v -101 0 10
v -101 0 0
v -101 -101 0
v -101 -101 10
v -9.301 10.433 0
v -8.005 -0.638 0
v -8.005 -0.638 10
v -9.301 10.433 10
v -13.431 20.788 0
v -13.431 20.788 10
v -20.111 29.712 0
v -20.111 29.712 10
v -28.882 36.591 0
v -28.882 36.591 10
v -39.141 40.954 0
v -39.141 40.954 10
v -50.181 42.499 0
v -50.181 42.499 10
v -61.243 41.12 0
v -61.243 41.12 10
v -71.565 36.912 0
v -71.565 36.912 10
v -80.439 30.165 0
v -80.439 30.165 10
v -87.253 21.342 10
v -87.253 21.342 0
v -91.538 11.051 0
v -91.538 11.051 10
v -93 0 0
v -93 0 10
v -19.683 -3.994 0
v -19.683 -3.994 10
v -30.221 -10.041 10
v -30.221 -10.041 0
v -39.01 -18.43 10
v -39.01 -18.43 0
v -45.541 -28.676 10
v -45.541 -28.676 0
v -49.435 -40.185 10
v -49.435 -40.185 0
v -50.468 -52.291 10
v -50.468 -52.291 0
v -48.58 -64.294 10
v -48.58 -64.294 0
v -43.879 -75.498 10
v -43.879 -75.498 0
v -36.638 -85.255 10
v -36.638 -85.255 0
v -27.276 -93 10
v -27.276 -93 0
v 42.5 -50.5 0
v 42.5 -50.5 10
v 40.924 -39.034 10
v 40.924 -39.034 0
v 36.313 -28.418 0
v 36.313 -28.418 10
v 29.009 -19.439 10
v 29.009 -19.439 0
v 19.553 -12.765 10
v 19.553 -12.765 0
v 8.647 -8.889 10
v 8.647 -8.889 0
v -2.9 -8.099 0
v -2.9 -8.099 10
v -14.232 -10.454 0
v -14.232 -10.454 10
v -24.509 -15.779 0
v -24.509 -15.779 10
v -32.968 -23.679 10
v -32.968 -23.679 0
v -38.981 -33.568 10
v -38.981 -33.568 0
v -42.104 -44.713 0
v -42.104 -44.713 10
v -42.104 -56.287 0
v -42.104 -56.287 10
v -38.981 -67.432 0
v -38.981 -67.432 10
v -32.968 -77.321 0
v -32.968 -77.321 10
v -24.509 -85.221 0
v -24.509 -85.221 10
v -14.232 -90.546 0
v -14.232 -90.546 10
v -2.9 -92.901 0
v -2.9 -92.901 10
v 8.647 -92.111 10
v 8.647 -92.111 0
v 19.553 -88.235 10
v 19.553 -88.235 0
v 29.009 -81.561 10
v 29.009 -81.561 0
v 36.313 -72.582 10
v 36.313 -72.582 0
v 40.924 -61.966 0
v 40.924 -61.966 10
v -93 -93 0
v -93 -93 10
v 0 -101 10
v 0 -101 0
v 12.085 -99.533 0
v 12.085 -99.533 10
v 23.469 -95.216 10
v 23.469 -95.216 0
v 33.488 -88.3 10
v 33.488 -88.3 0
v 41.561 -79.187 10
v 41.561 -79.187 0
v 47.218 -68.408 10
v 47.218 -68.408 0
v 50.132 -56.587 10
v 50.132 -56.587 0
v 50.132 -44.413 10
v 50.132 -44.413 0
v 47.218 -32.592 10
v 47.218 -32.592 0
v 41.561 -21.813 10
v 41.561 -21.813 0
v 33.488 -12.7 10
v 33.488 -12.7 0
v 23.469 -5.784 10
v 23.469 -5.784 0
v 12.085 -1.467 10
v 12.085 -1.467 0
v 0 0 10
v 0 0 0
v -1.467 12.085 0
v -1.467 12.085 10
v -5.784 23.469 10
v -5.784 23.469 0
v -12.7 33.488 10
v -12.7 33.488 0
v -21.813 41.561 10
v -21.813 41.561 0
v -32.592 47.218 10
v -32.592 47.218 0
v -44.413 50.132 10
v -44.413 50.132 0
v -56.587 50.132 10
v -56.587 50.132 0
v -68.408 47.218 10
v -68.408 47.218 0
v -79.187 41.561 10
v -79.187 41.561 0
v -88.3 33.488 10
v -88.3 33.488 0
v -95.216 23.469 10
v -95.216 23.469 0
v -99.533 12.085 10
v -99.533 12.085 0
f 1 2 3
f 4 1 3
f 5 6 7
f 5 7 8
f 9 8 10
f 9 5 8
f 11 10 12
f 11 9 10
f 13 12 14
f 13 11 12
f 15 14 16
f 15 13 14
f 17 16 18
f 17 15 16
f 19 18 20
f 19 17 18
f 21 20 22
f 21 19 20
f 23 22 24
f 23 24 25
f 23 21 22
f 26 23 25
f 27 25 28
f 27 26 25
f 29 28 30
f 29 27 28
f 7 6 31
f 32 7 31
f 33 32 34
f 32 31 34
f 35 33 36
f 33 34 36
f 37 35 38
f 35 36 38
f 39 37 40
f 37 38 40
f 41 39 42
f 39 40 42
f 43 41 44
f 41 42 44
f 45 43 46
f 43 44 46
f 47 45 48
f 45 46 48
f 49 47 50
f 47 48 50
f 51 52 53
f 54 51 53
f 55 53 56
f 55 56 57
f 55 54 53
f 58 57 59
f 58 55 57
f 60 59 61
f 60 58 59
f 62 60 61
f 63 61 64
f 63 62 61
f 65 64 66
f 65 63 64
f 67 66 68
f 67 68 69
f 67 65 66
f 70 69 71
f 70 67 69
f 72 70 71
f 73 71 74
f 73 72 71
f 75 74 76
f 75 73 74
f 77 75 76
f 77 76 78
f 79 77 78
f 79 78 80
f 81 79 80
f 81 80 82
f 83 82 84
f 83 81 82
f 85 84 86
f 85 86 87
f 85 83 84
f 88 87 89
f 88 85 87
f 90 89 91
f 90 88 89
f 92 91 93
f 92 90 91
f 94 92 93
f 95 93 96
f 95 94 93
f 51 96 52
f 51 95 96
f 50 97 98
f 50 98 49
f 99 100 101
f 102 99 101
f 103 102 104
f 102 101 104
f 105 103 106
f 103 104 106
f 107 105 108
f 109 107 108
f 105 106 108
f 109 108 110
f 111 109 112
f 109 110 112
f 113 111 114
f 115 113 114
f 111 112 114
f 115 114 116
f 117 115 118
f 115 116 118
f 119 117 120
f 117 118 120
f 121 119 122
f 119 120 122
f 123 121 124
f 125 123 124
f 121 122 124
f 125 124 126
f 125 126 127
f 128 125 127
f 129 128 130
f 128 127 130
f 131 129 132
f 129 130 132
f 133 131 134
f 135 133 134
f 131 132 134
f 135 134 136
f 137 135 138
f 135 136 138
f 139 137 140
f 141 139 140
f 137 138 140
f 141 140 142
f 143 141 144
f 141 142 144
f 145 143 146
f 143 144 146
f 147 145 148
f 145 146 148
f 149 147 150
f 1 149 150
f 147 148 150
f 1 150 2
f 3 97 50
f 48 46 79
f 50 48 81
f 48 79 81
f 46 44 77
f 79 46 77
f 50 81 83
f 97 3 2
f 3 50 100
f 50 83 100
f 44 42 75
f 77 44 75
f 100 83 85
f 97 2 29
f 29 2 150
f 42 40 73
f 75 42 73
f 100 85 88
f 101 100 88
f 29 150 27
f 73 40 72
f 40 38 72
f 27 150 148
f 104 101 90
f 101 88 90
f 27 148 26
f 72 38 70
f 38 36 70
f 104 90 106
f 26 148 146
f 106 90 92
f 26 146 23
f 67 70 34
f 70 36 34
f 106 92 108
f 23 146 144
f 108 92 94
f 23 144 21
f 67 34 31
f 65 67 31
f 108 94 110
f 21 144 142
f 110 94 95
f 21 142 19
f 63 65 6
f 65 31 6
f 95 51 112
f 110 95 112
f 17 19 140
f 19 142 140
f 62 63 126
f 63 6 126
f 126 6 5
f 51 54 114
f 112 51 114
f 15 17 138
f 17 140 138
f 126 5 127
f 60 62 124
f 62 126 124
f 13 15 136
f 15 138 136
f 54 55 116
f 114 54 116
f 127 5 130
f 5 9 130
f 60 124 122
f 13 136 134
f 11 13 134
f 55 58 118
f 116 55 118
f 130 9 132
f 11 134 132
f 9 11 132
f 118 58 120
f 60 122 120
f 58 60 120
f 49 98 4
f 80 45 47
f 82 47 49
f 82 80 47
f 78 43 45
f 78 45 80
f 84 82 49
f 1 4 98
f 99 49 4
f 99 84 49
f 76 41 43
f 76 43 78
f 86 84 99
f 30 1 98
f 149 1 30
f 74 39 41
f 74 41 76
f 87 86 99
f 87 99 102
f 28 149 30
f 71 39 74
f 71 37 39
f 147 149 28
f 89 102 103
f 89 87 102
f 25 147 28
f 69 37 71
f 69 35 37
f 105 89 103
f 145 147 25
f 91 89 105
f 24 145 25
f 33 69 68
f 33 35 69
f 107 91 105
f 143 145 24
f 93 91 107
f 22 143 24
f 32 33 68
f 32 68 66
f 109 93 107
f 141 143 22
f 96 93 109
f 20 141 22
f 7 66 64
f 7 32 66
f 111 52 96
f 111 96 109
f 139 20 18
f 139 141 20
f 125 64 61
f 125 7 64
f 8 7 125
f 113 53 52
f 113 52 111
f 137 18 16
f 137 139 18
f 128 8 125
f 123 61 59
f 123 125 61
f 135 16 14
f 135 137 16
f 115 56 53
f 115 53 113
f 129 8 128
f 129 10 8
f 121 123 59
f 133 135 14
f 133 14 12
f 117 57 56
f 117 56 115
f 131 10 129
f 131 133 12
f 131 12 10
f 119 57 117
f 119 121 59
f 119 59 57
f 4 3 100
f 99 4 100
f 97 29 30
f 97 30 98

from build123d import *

# Parameters (mm, degrees)
SKETCH_R  = 42.5
PAD_DEPTH = 10


with BuildPart() as part:
    # Sketch → Pad (new body)
    with BuildSketch(Plane.XY):
        with BuildLine():
            Line((-101, 0), (-101, -101))
            Line((-101, -101), (0, -101))
            ThreePointArc((0, -101), (50.5, -50.5), (0, 0))
            ThreePointArc((0, 0), (-50.5, 50.5), (-101, 0))
        make_face()
        with Locations((0, -50.5)):
            Circle(SKETCH_R, mode=Mode.SUBTRACT)
        with BuildLine():
            ThreePointArc((-8.004796, -0.638459), (-49.435348, -40.185137), (-27.276363, -93))
            Line((-93, -93), (-27.276363, -93))
            Line((-93, 0), (-93, -93))
            ThreePointArc((-8.004796, -0.638459), (-50.180761, 42.498801), (-93, 0))
        make_face(mode=Mode.SUBTRACT)
    extrude(amount=PAD_DEPTH)


solid = part.part
